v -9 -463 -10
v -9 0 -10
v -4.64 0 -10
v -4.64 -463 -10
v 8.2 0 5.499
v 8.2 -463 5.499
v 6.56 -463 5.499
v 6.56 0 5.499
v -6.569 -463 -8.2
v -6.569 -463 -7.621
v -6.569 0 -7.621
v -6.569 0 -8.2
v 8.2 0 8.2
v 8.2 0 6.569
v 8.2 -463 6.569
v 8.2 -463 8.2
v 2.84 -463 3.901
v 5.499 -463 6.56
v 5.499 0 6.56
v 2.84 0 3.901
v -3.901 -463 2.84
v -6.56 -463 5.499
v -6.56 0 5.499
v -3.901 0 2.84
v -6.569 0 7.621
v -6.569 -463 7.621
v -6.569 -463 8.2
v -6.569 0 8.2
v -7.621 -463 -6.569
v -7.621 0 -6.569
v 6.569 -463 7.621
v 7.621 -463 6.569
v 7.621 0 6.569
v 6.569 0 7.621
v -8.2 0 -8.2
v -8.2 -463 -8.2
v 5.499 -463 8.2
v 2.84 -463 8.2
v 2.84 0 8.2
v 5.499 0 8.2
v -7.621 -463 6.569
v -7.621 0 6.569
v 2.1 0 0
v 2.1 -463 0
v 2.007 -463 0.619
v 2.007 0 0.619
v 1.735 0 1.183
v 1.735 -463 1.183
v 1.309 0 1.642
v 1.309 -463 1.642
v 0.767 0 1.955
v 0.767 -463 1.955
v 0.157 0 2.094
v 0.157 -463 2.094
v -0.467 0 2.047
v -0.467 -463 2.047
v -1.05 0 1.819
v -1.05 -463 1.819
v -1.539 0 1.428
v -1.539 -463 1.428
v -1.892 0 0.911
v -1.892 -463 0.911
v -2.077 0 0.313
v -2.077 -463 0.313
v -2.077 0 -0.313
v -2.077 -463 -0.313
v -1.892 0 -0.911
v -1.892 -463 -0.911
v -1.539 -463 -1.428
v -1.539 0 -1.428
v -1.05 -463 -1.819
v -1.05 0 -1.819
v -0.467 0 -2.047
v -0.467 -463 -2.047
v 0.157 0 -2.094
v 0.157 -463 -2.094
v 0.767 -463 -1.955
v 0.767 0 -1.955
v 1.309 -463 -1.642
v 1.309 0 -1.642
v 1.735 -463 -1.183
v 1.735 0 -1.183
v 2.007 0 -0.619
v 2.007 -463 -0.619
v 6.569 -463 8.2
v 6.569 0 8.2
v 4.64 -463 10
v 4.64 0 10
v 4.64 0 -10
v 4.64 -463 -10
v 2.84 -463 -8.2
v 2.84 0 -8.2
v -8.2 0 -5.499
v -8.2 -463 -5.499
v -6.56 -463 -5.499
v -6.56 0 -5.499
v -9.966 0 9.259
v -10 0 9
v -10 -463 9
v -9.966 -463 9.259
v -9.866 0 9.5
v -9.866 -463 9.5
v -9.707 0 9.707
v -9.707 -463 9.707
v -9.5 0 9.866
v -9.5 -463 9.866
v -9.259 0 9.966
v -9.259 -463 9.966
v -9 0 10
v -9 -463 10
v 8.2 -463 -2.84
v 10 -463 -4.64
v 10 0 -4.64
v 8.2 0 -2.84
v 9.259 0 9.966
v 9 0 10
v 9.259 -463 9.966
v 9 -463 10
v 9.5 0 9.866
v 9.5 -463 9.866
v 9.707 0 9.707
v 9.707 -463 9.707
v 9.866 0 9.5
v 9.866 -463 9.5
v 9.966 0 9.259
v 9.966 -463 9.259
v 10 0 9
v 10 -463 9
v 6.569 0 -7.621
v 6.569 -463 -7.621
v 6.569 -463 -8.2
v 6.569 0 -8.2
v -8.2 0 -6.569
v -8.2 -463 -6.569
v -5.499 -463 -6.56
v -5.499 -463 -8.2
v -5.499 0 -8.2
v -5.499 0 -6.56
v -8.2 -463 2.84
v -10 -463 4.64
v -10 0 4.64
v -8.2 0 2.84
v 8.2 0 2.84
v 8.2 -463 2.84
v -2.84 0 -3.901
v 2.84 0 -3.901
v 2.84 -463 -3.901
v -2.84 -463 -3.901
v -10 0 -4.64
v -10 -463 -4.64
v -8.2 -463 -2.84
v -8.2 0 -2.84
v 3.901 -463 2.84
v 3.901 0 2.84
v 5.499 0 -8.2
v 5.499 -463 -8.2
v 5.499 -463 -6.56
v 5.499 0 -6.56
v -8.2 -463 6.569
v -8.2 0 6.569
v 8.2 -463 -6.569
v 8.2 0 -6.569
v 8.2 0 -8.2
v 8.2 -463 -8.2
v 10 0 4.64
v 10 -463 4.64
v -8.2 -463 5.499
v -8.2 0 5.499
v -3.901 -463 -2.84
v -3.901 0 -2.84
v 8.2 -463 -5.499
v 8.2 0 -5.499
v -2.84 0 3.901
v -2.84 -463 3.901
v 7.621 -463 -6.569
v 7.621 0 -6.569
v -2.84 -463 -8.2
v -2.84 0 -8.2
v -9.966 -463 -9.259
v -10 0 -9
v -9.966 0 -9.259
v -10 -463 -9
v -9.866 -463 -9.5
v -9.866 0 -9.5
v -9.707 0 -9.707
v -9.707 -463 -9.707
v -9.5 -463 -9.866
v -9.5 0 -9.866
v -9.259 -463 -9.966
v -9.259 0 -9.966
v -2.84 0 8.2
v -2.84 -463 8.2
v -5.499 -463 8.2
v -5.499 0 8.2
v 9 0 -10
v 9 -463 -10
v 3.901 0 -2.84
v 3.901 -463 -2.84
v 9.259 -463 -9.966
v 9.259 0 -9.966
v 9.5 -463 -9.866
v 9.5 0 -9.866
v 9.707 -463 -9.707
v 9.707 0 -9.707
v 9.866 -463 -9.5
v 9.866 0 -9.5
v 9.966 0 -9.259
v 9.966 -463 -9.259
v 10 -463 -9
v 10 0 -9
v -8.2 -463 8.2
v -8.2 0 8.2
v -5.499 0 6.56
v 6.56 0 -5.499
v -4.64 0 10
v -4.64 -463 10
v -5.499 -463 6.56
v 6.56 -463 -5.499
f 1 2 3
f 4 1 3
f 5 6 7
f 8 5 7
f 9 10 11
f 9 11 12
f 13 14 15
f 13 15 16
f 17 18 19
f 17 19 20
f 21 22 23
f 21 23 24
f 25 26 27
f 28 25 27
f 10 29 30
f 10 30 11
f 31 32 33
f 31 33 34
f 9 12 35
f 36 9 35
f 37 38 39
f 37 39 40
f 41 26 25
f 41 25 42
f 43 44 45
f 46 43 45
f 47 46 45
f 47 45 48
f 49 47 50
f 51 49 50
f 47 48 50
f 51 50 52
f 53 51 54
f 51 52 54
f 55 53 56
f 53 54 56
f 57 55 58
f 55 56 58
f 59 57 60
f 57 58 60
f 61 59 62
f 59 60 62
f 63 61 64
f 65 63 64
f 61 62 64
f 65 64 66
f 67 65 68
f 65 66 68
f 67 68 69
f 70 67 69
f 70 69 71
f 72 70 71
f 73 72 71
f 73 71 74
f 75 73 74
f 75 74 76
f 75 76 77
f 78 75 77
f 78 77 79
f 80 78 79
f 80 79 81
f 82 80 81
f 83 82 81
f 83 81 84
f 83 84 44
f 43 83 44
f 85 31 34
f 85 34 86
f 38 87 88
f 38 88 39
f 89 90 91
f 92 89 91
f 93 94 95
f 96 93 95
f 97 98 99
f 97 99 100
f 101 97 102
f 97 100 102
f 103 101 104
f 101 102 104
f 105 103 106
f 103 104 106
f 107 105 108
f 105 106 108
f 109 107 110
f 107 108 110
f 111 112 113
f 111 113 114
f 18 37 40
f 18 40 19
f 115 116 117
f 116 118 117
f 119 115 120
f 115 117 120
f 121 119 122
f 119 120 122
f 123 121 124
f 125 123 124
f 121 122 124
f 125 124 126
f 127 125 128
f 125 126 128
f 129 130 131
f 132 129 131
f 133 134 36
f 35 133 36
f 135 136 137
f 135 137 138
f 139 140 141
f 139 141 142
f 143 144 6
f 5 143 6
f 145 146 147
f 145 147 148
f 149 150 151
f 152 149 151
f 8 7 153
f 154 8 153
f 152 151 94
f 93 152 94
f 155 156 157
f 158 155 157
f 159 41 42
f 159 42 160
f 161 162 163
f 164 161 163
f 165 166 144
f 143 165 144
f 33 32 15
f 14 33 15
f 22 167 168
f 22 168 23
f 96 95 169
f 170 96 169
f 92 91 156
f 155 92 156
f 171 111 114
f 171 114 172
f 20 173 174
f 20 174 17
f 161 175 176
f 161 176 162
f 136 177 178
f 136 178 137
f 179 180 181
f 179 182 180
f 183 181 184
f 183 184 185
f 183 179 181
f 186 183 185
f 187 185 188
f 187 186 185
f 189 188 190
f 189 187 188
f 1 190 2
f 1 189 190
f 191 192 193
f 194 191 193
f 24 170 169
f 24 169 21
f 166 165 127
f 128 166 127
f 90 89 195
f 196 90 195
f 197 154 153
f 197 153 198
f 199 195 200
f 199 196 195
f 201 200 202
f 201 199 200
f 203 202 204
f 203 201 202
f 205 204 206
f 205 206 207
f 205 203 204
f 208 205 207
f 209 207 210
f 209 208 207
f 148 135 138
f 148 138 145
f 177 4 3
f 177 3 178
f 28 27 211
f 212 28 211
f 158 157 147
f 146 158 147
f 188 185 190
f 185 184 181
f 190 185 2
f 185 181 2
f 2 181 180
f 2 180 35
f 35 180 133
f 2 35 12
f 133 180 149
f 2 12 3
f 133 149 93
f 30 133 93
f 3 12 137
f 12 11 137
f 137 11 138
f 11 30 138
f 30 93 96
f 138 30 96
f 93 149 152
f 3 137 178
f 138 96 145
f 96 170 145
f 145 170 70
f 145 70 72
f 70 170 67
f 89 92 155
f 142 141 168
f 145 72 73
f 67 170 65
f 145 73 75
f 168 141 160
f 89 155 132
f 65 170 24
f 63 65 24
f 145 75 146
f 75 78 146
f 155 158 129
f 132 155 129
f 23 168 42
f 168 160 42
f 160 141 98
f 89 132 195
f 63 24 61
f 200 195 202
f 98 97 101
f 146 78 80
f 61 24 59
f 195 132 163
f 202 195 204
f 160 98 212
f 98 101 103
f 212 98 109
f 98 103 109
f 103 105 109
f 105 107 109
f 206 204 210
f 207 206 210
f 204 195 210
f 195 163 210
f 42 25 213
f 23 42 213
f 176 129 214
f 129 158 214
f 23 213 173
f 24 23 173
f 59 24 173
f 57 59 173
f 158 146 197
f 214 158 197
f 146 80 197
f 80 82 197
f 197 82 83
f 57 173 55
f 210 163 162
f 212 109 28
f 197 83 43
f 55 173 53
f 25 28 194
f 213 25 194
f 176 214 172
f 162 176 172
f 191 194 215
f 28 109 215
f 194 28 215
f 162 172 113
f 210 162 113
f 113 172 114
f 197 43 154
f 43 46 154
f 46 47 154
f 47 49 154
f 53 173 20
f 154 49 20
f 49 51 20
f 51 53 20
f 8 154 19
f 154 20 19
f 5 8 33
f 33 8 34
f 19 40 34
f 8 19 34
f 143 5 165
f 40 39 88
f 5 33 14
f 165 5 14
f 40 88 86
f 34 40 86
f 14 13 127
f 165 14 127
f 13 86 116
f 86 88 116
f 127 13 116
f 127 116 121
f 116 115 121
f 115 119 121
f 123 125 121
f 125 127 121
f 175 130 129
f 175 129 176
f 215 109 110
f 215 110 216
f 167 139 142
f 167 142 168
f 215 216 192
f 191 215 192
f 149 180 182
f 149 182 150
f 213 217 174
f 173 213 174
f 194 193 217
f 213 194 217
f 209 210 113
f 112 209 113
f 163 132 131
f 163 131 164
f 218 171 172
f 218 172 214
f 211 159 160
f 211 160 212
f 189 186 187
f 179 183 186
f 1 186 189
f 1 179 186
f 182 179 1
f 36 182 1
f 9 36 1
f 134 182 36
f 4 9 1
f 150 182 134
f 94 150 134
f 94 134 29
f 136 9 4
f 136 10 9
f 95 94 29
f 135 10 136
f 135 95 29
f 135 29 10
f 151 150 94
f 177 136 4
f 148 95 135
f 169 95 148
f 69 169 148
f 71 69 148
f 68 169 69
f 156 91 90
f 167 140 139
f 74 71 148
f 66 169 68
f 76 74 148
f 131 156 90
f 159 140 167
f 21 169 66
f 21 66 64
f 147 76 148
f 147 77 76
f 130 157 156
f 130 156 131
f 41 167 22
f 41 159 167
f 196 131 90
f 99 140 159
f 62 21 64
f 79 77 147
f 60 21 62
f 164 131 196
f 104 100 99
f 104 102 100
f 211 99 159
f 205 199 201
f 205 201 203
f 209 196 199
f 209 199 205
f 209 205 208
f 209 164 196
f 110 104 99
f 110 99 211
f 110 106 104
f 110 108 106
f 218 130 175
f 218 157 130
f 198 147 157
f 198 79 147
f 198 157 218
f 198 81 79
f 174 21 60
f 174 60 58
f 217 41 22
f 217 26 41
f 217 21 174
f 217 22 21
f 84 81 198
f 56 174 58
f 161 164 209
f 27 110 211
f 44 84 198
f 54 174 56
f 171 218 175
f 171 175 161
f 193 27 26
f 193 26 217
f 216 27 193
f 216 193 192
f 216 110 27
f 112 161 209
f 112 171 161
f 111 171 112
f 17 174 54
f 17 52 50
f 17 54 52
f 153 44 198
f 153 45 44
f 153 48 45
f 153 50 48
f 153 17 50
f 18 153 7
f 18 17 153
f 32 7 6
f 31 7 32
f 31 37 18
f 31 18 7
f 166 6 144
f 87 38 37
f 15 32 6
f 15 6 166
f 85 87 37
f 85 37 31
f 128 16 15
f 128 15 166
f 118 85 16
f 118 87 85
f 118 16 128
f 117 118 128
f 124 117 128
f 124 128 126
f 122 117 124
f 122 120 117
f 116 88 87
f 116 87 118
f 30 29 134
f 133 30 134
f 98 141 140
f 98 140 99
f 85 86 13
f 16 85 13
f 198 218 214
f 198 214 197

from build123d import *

# Parameters (mm, degrees)
F0_W            = 20
F0_H            = 20
F1_DEPTH        = 463
F2_R            = 2.1
F3_DEPTH        = 463.001
F4_R            = 1
F6_DEPTH        = 463.001
F6_COPIES_COUNT = 4


# Not quite as in the source:
# - a pattern or mirror of a feature is missing from the dataset's text; its kind, count and spacing are read off the source's solid


with BuildPart() as f1:
    # F0 (on Front) → F1 (new body)
    with BuildSketch(Plane.XZ):
        Rectangle(F0_W, F0_H)
    extrude(amount=F1_DEPTH)

    # F2 (on face) → F3 (cut, through all)
    with BuildSketch(Plane.XZ.offset(463)):
        Circle(F2_R)
    extrude(amount=-F3_DEPTH, mode=Mode.SUBTRACT)

    # F4
    f4_edges = [f1.edges().sort_by_distance(p)[0] for p in [
        (-10, -231.5, 10),
        (10, -231.5, 10),
        (10, -231.5, -10),
        (-10, -231.5, -10),
    ]]
    fillet(f4_edges, radius=F4_R)

    # F5 (on face) → F6 (cut, through all)
    with BuildSketch(Plane.XZ.offset(463)):
        Polygon((0, 3.9006601718), (0, 10), (-2.84, 10), (-4.64, 10), (-2.84, 8.2), (-5.4993398282, 8.2), (-5.4993398282, 6.56), (-2.84, 3.9006601718), align=None)
        Polygon((-6.5693398282, 8.2), (-8.2, 8.2), (-7.0953059148, 7.0953059148), (-6.5693398282, 7.6212720014), align=None)
    f6 = extrude(amount=-F6_DEPTH, mode=Mode.SUBTRACT)

    # F6_copies: F6 ×4 about axis
    f6_copies_axis = Axis((0, 0, 0), (0, 1, 0))
    for i in range(1, F6_COPIES_COUNT):
        add(f6.rotate(f6_copies_axis, i * 360 / F6_COPIES_COUNT), mode=Mode.SUBTRACT)

    # F6_copies1: F6 across plane
    add(f6.mirror(Plane(origin=(0, 0, 0), x_dir=(-0.7071067812, 0, -0.7071067812), z_dir=(0.7071067812, 0, -0.7071067812))), mode=Mode.SUBTRACT)

    # F6_copies2: F6 across plane
    add(f6.mirror(Plane(origin=(0, 0, 0), x_dir=(-1, 0, 0), z_dir=(0, 0, -1))), mode=Mode.SUBTRACT)

    # F6_copies3: F6 across plane
    add(f6.mirror(Plane(origin=(0, 0, 0), x_dir=(0, 0, 1), z_dir=(1, 0, 0))), mode=Mode.SUBTRACT)

    # F6_copies4: F6 across plane
    add(f6.mirror(Plane(origin=(0, 0, 0), x_dir=(0.7071067812, 0, -0.7071067812), z_dir=(-0.7071067812, 0, -0.7071067812))), mode=Mode.SUBTRACT)


solid = f1.part
